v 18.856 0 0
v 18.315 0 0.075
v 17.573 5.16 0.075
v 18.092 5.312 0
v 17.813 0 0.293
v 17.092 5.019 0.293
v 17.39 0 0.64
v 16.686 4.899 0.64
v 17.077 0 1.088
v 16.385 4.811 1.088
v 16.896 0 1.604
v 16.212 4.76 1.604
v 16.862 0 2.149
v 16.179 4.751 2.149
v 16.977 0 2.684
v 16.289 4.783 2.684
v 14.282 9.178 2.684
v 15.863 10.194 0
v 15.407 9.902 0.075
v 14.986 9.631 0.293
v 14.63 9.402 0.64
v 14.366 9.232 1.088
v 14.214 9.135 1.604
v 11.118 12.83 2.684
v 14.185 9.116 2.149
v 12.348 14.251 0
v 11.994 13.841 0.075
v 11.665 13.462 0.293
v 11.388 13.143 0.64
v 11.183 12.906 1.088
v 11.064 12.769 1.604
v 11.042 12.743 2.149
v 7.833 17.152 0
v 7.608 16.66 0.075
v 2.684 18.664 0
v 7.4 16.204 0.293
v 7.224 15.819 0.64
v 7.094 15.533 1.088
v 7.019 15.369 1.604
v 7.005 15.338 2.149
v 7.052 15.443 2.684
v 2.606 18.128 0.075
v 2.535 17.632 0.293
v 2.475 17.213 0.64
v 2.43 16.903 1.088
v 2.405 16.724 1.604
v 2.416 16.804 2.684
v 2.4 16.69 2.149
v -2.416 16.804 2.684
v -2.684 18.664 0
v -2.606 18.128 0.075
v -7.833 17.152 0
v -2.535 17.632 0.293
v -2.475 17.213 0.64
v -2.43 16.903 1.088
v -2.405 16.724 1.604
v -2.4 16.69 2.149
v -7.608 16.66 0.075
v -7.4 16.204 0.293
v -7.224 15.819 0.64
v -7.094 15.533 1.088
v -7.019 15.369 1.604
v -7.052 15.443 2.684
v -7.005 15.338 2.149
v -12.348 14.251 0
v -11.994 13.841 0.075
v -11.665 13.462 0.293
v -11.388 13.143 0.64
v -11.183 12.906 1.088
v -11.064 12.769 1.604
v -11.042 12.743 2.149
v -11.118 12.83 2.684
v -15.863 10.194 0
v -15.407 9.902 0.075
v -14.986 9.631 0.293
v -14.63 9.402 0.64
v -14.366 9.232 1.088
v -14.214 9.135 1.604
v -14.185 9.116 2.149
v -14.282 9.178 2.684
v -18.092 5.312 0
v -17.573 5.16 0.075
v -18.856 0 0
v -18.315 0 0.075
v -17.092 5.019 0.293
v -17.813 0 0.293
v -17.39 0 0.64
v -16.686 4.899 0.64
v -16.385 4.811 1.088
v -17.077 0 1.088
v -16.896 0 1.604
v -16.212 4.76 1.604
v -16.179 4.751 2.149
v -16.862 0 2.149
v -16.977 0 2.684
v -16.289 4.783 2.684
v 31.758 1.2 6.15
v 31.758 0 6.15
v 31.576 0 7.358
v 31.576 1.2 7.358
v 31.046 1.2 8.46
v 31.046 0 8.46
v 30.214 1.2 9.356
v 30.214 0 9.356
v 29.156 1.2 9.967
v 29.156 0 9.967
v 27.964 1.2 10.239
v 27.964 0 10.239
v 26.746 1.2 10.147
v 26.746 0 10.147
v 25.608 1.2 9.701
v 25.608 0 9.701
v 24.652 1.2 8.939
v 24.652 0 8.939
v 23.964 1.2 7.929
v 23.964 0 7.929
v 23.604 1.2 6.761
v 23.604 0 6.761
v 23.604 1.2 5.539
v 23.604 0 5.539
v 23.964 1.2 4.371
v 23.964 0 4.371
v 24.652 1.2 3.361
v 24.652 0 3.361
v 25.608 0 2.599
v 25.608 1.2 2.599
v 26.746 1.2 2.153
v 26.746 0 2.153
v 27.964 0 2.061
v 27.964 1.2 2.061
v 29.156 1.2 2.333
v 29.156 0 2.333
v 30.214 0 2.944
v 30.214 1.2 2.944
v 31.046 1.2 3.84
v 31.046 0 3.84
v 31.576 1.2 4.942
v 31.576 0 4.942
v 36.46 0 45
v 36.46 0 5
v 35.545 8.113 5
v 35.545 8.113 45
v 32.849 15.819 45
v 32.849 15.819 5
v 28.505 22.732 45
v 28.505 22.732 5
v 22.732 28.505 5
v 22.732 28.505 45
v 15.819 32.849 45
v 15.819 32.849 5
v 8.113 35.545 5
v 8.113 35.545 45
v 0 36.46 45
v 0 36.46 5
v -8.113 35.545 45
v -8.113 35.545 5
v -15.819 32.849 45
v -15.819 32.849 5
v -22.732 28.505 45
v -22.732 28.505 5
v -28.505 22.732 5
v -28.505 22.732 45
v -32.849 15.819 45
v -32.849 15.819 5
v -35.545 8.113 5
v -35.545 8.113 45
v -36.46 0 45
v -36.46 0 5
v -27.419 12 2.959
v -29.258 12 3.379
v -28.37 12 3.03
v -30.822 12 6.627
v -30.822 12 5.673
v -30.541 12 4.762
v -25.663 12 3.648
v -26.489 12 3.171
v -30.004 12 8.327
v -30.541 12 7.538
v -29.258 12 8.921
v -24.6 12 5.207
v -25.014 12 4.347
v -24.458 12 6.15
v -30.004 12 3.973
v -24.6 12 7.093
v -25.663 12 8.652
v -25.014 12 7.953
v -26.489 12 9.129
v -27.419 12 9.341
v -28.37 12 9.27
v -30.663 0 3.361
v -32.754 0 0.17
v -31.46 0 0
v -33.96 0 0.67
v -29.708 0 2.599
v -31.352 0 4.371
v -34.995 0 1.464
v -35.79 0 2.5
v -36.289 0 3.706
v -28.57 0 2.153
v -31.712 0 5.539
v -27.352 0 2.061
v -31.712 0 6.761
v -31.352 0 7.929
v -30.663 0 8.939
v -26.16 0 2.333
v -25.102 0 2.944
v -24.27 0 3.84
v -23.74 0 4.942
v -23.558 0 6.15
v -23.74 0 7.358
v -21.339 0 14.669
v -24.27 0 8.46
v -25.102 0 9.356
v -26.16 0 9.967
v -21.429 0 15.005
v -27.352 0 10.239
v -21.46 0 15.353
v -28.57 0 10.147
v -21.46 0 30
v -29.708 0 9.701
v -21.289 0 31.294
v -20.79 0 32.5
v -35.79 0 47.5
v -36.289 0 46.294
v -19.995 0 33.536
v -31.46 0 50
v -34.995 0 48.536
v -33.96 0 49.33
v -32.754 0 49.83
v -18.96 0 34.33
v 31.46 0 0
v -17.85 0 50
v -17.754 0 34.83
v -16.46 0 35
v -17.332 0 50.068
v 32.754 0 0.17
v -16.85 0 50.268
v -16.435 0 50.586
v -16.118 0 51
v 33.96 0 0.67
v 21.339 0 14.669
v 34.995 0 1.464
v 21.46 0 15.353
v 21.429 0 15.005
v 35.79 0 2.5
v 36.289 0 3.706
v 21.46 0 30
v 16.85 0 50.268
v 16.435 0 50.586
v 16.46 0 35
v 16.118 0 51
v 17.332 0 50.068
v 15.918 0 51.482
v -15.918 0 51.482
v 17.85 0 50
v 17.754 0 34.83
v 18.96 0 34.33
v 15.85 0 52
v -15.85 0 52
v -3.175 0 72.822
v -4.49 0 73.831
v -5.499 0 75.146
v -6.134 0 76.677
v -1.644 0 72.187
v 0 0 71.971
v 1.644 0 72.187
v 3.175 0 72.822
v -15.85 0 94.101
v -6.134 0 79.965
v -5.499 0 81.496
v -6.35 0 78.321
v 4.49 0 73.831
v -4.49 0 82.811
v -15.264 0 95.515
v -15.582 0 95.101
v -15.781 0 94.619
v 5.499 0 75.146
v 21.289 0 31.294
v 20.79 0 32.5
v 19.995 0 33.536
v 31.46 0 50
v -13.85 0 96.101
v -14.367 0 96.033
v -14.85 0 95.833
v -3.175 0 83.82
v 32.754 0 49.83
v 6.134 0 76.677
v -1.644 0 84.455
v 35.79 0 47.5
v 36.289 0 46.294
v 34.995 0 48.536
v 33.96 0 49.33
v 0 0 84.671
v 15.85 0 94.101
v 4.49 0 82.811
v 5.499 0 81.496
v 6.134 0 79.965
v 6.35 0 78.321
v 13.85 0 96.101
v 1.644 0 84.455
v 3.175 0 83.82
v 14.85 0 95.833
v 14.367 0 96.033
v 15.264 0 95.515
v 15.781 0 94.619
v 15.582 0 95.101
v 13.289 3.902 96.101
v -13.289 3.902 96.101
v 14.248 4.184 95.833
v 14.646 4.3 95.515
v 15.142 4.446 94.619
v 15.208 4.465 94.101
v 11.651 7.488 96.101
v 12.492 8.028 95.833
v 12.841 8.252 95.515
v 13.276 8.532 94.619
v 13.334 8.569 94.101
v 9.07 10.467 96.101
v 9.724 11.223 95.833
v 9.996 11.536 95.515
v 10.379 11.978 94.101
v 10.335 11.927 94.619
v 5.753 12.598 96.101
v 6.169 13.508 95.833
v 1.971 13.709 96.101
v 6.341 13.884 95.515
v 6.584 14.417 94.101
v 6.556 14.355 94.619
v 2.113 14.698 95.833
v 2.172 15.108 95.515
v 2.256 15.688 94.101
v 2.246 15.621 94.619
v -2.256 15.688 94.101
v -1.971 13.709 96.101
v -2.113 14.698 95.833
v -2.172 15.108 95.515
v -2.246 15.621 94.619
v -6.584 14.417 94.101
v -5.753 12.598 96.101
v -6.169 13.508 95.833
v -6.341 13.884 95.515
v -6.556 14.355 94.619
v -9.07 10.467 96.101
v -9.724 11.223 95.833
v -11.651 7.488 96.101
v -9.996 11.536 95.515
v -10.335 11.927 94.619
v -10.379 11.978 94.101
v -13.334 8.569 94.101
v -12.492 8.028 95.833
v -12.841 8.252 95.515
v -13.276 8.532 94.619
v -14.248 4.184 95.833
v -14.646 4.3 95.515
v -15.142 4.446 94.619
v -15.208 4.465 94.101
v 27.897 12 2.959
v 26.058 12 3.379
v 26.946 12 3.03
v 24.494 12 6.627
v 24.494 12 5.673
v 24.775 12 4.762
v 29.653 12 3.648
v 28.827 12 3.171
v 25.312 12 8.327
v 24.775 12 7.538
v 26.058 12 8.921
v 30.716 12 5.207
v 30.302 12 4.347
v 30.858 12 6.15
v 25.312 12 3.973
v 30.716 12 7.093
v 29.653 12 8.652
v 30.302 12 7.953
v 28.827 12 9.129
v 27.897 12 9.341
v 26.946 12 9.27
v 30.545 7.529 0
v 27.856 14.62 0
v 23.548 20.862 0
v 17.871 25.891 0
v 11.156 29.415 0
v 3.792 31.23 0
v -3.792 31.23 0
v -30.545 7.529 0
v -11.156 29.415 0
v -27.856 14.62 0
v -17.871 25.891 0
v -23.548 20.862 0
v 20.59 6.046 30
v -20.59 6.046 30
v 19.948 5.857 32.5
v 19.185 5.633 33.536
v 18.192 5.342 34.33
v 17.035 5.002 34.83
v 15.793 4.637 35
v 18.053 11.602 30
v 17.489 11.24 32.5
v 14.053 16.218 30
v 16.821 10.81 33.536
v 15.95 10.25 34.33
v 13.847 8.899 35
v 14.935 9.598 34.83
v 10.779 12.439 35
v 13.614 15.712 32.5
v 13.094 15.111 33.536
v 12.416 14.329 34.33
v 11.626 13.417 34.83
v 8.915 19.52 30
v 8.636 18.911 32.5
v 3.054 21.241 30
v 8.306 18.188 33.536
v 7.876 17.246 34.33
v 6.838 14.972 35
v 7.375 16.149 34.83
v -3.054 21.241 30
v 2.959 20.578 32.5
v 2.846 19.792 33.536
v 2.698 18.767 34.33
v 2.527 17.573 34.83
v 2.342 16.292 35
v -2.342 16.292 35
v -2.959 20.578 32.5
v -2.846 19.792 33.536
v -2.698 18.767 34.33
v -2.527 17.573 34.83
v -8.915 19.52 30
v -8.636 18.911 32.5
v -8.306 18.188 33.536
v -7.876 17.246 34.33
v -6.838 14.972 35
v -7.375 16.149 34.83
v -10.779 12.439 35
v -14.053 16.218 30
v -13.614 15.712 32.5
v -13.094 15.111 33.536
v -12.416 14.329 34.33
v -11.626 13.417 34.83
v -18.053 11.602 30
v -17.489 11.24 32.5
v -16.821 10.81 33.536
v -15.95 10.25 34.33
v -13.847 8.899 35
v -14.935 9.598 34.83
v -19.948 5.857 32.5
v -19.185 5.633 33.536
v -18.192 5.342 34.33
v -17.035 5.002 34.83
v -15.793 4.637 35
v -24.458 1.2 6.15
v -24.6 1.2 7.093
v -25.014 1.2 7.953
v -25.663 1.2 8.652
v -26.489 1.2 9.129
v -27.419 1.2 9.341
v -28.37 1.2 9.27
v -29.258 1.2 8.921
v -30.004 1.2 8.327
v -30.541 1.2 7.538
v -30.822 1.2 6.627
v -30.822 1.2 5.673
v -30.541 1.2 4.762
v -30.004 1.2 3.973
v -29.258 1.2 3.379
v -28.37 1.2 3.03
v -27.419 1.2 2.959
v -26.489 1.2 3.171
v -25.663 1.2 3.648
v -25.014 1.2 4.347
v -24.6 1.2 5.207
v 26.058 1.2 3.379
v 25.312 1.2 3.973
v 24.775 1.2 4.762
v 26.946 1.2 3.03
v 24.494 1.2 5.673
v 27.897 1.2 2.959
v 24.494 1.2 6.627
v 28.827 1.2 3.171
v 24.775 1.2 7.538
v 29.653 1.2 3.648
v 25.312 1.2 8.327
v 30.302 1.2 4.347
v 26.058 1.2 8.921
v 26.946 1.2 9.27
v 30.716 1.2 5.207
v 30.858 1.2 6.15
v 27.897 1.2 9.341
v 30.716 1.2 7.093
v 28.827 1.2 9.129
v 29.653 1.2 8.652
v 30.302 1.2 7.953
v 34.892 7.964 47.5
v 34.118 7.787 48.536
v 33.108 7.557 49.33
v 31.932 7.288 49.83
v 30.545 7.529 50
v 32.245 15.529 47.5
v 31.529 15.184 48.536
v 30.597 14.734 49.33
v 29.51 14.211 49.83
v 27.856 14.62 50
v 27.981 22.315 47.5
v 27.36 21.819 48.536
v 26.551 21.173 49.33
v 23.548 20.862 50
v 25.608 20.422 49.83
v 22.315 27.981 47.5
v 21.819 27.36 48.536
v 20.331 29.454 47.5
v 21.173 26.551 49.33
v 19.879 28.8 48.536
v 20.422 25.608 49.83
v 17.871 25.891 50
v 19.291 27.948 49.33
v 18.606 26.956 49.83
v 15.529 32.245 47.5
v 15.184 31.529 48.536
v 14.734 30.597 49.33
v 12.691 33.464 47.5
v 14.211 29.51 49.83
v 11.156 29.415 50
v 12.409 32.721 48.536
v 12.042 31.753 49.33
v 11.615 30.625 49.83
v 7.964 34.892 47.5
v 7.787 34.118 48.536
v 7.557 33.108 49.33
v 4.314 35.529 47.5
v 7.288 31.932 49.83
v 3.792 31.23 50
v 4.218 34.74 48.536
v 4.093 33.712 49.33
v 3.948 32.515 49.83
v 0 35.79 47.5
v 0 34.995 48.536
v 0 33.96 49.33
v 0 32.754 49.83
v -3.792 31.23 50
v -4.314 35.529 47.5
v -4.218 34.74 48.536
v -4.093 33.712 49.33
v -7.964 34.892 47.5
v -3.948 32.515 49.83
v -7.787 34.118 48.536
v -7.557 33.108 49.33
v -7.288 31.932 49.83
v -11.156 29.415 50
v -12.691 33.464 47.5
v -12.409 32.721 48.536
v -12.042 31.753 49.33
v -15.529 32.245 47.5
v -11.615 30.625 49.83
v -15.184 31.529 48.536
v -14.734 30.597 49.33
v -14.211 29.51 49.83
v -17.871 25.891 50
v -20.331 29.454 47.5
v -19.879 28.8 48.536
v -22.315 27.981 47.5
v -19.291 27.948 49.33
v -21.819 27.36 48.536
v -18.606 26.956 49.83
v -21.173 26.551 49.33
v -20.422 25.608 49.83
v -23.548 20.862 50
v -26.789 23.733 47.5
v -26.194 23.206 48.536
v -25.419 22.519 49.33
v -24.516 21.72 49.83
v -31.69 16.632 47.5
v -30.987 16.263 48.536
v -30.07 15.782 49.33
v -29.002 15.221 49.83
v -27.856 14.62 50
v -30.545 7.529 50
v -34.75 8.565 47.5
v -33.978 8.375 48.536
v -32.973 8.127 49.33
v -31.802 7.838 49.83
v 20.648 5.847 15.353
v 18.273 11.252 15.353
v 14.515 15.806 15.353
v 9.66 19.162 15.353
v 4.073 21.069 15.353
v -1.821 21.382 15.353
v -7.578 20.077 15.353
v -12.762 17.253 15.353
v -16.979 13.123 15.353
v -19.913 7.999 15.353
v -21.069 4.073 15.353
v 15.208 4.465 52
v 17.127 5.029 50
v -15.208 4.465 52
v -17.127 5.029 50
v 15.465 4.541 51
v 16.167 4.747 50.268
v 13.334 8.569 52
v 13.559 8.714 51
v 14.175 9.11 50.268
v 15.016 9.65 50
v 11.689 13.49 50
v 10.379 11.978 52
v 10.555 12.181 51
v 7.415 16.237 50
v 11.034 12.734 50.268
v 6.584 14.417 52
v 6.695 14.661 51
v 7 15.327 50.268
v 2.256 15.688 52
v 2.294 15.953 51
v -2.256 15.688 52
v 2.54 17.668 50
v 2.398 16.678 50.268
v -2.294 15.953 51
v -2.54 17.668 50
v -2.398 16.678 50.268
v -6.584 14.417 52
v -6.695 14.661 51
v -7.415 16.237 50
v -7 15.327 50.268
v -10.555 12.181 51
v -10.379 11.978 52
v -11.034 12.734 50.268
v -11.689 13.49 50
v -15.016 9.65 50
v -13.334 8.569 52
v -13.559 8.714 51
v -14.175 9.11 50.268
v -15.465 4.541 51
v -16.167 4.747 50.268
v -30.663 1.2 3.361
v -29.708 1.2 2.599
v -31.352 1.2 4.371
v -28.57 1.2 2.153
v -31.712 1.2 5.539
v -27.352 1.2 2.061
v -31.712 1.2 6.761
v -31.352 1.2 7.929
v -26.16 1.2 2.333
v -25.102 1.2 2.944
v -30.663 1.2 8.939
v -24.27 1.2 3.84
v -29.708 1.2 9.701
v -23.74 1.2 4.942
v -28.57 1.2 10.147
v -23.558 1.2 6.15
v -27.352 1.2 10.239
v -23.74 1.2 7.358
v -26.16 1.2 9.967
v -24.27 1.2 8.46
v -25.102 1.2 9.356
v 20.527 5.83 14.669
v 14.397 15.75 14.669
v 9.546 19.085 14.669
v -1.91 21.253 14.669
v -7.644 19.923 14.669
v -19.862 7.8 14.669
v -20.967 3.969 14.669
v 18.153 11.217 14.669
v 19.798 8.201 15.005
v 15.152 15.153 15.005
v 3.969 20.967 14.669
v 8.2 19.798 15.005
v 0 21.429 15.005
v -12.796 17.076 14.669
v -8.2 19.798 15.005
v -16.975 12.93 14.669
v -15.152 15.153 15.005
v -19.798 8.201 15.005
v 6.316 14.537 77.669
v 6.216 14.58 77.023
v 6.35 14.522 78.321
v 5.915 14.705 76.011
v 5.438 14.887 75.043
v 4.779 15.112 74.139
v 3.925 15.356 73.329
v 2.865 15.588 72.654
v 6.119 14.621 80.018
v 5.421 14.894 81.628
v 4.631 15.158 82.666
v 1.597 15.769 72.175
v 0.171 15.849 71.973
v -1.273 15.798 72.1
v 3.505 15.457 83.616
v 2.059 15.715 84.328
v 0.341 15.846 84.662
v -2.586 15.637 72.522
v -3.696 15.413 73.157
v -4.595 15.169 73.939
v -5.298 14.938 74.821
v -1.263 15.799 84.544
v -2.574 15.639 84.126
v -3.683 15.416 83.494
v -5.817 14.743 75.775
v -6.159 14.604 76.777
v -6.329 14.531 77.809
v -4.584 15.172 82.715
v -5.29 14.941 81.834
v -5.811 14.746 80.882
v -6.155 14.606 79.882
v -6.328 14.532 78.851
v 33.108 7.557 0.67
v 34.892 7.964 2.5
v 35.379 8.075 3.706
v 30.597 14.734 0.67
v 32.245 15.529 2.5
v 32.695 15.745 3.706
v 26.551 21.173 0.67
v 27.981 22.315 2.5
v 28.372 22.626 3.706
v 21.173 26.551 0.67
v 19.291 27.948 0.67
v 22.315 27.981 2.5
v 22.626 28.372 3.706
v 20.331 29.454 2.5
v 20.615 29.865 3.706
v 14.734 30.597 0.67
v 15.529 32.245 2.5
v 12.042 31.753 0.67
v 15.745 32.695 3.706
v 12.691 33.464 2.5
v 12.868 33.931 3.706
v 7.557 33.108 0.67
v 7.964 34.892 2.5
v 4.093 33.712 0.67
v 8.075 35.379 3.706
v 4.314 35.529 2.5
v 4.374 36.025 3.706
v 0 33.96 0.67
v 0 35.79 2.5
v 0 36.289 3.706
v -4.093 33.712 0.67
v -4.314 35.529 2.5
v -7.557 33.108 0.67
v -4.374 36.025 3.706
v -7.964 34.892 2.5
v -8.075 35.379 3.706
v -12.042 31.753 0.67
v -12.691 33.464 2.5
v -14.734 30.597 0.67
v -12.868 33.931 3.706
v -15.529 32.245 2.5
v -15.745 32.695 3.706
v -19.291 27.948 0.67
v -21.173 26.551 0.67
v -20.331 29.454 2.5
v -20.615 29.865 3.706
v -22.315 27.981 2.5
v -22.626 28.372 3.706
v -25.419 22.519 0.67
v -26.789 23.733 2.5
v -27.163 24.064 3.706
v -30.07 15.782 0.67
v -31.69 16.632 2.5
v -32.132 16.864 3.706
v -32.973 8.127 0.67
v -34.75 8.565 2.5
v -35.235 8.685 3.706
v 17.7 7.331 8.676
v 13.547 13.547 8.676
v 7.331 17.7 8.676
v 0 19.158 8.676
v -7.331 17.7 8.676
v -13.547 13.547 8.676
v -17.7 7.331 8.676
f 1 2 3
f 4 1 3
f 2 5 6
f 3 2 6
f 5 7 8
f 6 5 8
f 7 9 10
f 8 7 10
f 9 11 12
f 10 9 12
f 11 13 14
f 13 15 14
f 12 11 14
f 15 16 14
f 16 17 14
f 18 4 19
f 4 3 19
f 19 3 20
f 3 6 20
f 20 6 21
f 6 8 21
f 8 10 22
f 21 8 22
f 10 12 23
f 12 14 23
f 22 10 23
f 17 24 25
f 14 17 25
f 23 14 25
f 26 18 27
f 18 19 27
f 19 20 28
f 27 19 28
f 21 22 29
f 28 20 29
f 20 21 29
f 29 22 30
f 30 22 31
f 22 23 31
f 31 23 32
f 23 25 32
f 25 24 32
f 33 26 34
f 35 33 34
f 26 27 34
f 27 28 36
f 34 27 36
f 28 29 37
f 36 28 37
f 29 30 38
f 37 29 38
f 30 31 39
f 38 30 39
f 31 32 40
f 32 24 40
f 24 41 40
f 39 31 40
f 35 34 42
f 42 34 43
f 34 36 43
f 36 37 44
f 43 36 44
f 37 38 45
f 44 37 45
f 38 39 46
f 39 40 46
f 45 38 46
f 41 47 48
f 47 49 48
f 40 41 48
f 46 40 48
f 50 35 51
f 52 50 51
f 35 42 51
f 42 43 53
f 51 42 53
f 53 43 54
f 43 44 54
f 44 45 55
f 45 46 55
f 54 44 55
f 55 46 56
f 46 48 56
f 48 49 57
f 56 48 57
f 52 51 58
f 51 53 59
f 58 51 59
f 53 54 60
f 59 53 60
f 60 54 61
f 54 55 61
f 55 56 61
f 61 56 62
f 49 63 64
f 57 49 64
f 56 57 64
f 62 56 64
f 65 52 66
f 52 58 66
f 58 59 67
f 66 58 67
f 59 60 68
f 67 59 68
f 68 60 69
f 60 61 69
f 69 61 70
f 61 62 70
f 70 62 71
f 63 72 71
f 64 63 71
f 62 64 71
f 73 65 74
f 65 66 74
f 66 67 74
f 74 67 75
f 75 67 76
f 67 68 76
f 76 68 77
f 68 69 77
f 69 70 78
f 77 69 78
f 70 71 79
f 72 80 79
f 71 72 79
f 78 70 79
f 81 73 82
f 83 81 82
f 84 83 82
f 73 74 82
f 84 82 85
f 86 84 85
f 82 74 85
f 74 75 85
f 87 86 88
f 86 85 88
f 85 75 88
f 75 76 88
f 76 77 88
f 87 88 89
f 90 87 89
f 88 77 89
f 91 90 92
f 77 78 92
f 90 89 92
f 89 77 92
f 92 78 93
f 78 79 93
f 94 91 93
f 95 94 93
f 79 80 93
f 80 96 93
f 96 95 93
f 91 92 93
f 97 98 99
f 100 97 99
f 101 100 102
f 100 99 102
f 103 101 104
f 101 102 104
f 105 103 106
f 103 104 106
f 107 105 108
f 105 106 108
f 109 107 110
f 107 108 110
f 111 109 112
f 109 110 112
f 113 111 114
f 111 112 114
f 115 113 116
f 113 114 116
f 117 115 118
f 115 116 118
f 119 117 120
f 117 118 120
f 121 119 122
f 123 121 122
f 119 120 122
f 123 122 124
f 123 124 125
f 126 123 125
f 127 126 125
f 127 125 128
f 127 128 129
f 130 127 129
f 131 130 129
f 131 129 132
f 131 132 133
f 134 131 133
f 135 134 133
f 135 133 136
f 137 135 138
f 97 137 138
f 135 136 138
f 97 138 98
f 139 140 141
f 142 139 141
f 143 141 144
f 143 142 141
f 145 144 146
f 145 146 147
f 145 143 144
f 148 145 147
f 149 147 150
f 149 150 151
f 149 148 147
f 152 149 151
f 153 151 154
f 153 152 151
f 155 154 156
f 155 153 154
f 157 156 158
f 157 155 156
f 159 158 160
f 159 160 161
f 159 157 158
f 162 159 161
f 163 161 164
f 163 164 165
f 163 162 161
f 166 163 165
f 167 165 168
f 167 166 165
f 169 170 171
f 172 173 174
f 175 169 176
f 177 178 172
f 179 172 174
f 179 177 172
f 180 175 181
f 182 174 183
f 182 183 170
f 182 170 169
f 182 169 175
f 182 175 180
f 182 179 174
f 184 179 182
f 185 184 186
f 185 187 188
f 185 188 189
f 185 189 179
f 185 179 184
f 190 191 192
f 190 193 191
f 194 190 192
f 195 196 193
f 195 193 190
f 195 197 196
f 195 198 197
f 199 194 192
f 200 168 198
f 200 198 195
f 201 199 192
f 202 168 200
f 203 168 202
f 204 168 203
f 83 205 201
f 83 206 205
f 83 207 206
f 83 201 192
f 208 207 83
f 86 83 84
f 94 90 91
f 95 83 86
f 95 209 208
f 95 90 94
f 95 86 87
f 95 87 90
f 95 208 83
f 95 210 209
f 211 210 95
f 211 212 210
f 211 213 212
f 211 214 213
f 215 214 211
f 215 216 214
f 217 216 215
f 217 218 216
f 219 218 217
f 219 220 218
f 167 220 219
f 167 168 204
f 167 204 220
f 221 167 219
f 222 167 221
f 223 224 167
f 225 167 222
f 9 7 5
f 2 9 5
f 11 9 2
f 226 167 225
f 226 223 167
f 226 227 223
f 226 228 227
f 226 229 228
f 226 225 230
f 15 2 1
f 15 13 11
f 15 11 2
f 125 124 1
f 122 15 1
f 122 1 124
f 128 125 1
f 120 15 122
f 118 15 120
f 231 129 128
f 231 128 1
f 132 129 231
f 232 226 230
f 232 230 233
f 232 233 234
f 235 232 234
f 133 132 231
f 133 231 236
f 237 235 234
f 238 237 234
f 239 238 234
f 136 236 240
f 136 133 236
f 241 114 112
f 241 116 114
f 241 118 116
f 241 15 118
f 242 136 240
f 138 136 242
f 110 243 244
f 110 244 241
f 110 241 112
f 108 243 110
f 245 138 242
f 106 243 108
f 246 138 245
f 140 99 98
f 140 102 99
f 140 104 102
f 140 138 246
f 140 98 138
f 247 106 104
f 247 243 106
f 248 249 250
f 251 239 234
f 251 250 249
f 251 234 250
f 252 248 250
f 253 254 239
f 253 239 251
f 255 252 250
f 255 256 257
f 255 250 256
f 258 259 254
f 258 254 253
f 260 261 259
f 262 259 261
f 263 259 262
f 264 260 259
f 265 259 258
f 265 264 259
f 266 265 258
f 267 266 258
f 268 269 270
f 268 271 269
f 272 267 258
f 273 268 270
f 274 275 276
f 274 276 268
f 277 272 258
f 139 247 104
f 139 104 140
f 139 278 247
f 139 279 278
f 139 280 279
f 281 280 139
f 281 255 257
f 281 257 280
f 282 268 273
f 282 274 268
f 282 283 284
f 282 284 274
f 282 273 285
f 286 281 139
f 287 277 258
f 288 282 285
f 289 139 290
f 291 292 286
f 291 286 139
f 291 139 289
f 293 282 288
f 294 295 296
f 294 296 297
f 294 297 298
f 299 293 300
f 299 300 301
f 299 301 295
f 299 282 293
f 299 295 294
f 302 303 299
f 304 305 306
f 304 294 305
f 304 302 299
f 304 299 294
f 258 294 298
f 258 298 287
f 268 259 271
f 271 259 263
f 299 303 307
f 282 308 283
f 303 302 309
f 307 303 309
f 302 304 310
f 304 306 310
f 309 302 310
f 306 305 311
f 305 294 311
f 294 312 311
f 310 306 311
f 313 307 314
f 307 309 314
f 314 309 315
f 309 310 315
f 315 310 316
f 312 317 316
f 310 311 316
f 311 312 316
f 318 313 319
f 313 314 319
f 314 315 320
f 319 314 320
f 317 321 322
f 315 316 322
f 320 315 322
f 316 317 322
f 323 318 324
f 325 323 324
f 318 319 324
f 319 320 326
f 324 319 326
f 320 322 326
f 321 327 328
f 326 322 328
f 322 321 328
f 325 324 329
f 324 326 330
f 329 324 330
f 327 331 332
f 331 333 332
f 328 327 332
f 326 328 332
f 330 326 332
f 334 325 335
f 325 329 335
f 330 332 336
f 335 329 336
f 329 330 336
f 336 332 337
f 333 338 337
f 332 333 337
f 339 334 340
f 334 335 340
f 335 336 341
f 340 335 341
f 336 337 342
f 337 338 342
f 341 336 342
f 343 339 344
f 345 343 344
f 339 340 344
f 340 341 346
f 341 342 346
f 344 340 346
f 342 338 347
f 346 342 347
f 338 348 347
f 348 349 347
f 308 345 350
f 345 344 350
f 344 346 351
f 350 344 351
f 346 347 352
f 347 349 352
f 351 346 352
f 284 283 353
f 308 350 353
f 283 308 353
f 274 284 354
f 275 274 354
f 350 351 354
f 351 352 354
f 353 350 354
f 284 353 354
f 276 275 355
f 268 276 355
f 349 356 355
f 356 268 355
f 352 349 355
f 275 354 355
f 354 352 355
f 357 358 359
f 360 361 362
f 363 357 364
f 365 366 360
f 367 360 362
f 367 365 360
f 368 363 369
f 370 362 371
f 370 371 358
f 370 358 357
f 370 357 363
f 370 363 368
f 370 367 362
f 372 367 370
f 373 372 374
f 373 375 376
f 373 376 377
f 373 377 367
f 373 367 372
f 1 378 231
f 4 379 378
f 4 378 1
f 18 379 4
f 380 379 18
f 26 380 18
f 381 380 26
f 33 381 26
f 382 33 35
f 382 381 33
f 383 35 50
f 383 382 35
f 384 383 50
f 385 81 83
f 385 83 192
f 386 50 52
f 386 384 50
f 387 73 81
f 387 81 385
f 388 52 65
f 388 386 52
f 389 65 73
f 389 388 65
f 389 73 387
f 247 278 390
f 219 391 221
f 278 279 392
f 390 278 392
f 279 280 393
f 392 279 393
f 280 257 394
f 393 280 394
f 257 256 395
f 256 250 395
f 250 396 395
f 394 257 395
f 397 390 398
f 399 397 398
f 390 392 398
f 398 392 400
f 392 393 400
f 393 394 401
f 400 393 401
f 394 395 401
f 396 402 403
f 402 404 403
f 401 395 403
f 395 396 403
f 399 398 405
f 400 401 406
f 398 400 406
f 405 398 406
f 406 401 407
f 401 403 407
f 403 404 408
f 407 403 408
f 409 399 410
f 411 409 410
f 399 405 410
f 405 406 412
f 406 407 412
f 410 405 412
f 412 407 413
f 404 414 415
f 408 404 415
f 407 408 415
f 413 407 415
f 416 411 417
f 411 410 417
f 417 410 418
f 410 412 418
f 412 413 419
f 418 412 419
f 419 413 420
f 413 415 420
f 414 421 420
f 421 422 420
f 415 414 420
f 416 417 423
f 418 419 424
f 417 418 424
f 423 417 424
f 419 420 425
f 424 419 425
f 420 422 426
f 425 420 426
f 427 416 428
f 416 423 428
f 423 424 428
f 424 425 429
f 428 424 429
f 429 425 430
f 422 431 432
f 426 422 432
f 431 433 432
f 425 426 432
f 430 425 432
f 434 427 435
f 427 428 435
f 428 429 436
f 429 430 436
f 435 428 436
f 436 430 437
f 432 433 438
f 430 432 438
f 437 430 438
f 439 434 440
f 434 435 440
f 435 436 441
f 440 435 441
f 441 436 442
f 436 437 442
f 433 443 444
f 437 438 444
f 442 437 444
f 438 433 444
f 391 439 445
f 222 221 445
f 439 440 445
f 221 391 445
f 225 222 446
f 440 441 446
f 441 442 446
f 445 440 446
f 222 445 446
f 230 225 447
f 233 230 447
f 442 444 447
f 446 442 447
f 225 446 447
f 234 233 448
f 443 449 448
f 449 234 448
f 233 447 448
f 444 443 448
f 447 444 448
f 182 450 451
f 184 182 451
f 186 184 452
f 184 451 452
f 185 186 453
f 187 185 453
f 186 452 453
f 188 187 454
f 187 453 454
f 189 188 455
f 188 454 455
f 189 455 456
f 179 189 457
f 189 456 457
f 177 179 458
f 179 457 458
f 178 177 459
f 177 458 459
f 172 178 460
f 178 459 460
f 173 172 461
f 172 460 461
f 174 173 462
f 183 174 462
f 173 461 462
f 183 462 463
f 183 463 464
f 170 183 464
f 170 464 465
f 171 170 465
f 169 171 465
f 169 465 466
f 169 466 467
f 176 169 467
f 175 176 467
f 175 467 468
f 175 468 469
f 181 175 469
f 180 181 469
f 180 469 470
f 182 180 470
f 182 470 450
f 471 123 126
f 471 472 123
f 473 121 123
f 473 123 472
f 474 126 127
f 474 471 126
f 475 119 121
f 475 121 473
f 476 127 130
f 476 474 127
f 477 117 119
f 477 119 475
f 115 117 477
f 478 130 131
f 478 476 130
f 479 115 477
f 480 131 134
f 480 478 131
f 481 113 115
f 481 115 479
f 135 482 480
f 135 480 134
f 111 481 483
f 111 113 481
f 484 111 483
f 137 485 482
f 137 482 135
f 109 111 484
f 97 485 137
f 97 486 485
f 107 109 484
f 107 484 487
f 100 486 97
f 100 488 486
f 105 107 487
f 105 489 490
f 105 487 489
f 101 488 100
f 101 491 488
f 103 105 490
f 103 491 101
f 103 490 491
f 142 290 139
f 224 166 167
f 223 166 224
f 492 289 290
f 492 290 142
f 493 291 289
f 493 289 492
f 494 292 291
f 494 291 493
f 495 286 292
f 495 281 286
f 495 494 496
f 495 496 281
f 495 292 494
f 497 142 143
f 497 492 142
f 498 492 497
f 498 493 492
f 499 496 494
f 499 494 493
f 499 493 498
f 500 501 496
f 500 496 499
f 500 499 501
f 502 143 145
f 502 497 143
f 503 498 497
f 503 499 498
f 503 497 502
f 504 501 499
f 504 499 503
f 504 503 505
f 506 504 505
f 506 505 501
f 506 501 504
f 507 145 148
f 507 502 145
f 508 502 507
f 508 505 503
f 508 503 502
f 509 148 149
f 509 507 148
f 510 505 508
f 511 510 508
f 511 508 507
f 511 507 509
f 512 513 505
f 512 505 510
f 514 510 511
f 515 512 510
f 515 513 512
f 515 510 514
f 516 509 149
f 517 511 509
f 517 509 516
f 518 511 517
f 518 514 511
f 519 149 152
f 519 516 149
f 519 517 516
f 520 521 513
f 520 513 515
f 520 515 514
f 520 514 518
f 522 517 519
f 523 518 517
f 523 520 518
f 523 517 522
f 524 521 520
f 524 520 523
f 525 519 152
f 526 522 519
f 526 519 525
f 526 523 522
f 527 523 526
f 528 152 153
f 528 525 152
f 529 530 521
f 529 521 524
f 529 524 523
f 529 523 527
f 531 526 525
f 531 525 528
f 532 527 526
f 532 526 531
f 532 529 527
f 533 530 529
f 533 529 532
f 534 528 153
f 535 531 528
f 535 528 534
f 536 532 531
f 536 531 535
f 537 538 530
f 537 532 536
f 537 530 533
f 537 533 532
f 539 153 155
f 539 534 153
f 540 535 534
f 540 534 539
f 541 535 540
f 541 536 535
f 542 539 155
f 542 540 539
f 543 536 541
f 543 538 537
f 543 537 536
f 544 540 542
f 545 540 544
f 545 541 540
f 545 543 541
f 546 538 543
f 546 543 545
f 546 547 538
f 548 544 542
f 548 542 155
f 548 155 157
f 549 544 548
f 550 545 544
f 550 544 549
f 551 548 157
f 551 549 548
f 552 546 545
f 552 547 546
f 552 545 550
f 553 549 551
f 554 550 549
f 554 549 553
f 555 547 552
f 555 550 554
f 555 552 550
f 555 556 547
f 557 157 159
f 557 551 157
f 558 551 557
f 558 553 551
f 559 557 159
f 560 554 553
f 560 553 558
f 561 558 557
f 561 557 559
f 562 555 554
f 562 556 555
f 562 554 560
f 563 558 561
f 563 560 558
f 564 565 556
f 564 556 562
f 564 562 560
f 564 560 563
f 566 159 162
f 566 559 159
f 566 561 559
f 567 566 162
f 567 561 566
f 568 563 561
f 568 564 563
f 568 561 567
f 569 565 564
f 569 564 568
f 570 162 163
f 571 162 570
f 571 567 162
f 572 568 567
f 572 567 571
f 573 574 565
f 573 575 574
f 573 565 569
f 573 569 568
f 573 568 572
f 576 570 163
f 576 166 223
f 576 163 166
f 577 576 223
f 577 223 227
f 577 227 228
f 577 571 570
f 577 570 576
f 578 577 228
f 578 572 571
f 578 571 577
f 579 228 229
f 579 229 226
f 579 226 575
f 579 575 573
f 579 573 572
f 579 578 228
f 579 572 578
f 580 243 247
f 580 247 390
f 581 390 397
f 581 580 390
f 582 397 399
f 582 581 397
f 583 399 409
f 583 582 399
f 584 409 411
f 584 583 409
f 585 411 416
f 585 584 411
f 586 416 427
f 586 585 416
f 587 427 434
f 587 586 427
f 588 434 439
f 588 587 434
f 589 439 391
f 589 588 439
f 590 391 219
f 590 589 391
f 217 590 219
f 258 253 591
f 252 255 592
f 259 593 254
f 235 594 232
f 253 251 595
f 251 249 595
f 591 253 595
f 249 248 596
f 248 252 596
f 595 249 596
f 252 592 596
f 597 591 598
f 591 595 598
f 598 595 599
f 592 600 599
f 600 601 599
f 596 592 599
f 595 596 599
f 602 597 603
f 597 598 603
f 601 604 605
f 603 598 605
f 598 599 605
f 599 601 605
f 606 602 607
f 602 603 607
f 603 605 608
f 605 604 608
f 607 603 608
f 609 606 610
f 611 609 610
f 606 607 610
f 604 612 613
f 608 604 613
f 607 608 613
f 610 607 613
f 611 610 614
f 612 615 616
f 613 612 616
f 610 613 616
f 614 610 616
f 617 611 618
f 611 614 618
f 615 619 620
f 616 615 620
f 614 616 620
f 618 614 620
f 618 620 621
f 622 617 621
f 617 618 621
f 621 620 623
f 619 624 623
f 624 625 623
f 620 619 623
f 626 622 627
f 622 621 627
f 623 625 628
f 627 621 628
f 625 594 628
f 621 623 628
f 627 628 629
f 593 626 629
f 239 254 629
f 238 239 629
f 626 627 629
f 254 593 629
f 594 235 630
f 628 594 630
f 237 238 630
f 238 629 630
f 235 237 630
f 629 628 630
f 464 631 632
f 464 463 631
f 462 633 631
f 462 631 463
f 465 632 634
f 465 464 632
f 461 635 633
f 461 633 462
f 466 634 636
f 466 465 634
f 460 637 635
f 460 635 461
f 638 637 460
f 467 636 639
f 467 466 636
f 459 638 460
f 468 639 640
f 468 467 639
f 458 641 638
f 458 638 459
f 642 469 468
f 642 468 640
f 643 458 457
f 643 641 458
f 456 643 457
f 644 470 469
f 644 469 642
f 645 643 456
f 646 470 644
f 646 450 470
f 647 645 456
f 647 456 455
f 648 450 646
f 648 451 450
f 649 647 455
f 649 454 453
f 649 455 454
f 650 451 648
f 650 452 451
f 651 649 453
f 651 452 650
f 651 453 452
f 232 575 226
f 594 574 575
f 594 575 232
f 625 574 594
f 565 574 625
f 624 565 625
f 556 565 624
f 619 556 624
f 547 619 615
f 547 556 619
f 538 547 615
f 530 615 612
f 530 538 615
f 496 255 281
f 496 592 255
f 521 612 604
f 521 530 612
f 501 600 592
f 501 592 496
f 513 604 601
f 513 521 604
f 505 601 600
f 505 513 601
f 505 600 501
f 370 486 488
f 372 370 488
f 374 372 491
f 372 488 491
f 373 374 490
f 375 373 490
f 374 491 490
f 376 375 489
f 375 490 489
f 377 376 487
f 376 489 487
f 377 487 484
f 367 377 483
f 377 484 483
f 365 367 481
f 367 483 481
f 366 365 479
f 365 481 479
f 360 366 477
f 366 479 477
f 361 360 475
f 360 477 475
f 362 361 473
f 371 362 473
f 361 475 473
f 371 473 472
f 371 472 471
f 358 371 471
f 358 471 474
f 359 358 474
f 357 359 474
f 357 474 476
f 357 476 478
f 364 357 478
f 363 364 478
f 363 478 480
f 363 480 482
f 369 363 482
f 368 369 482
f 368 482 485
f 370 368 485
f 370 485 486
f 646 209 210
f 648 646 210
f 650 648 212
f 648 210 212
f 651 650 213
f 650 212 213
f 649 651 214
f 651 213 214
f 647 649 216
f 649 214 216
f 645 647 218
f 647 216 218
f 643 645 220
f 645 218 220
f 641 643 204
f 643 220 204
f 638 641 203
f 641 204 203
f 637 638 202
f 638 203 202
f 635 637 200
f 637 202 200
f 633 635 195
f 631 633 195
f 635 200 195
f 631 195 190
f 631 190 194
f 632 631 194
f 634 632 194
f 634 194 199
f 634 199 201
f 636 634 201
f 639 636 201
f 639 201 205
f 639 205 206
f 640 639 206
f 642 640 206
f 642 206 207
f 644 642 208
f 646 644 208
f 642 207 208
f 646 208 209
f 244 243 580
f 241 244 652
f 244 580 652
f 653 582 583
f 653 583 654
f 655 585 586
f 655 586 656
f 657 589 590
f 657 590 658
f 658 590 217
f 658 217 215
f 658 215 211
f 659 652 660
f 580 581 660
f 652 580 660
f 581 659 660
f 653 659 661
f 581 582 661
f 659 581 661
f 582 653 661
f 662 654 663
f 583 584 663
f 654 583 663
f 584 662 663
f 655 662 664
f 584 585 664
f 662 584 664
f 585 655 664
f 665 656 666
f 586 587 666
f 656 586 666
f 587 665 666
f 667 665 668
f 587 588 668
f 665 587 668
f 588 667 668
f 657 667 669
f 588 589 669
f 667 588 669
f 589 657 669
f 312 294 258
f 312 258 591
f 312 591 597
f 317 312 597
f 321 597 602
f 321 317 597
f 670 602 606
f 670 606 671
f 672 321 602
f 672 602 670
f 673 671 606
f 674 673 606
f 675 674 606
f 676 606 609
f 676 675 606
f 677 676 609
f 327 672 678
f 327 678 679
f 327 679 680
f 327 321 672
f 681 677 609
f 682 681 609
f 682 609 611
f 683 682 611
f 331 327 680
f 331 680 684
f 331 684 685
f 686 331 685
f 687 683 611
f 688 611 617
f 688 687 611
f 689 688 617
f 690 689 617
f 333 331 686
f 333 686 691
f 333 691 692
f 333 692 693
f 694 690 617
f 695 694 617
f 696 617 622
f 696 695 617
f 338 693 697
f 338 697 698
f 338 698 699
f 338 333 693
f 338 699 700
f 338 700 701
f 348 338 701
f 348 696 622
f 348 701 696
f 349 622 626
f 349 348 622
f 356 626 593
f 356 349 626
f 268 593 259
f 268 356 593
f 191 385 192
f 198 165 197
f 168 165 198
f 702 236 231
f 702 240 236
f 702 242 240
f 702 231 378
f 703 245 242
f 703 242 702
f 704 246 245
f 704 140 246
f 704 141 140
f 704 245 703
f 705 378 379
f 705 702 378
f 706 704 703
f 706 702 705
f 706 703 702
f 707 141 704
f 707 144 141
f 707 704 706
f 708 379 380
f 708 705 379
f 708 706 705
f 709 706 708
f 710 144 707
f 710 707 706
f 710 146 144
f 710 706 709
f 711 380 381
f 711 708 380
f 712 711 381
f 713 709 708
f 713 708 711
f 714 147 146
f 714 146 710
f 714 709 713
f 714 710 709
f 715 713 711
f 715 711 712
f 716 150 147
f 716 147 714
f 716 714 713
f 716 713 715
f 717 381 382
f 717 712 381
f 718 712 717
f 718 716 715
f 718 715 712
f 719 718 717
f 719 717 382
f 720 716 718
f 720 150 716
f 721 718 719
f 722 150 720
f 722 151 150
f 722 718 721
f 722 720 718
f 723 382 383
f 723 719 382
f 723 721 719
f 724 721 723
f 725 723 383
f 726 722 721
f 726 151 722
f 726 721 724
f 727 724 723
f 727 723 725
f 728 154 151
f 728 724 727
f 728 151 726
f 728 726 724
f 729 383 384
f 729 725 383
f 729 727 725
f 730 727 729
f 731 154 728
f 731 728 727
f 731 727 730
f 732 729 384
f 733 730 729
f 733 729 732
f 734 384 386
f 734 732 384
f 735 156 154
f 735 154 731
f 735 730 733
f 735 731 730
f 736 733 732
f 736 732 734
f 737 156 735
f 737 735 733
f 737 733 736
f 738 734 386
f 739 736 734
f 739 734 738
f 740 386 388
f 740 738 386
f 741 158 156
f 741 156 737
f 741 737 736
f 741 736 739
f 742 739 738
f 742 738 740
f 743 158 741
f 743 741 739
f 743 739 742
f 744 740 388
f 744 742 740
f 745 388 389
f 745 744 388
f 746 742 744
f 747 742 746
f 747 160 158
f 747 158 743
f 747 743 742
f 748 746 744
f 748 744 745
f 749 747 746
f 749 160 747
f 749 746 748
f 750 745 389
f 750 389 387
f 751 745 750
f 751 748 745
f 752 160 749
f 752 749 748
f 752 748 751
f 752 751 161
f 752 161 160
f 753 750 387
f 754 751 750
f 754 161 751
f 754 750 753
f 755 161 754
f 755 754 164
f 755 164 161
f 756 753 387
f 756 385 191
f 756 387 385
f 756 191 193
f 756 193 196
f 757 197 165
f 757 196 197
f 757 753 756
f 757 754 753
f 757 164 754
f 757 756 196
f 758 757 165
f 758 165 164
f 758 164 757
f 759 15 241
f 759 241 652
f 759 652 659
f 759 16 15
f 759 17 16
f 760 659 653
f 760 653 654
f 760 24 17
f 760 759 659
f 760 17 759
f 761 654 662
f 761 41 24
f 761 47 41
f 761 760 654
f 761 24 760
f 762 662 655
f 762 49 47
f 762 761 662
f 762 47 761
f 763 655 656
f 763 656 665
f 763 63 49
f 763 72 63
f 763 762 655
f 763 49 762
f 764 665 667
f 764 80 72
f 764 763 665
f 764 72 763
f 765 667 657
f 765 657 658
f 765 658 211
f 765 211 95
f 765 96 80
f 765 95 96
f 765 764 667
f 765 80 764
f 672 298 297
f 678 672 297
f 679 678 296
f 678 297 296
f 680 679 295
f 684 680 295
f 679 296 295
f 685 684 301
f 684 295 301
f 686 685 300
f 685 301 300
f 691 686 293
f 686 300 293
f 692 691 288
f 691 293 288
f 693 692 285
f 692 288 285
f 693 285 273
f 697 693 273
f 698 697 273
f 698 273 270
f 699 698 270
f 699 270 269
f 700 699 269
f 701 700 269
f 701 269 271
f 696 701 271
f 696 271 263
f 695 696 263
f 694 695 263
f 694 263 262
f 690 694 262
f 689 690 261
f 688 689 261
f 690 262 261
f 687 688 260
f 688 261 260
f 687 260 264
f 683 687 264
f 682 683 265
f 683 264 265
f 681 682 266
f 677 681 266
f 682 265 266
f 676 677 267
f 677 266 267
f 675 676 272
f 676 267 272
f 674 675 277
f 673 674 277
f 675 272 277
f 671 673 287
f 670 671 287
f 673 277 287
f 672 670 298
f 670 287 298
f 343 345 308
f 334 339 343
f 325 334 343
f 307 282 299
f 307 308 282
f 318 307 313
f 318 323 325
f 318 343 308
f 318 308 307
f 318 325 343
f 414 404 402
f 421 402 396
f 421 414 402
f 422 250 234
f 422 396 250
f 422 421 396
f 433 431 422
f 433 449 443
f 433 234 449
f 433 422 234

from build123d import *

# Parameters (mm, degrees)
F1_ANGLE = -180
F2_R     = 2
F3_R     = 4.1
F3_R_2   = 3.2
F4_DEPTH = 1.2
F5_DEPTH = 12
F3_R_3   = 6.35
F6_DEPTH = 36.460554
F7_R     = 5


with BuildPart() as f1:
    # F0 (on Front) → F1 (revolve)
    with BuildSketch(Plane.XZ):
        with BuildLine():
            Line((21.459554, 35), (21.459554, 15))
            Line((21.459554, 15), (21.459554, 0))
            Line((21.459554, 0), (36.459554, 0))
            Line((36.459554, 0), (36.459554, 50))
            Line((36.459554, 50), (15.8496, 50))
            Line((15.8496, 50), (15.8496, 96.101))
            Line((15.8496, 96.101), (0, 96.101))
            Line((0, 96.101), (0, 84.671))
            ThreePointArc((0, 84.671), (4.490128, 82.811128), (6.35, 78.321))
            ThreePointArc((6.35, 78.321), (4.490128, 73.830872), (0, 71.971))
            Line((0, 71.971), (0, 35))
            Line((0, 35), (21.459554, 35))
        make_face()
        Polygon((21.459554, 15), (16, 0), (21.459554, 0), align=None)
    revolve(axis=Axis((0, 0, 65.5505), (0, 0, -1)), revolution_arc=F1_ANGLE)

    # F2
    f2_edges = [f1.edges().sort_by_distance(p)[0] for p in [
        (0, 15.8496, 50),
        (0, 15.8496, 96.101),
        (0, 16, 0),
        (0, 21.459554, 15),
    ]]
    fillet(f2_edges, radius=F2_R)

    # F3 (on Front) → F4 (cut)
    with BuildSketch(Plane.XZ):
        with Locations((27.657925, 6.15)):
            Circle(F3_R)
        with Locations((27.657925, 6.15)):
            Circle(F3_R_2, mode=Mode.SUBTRACT)
        with Locations((-27.657925, 6.15)):
            Circle(F3_R)
        with Locations((-27.657925, 6.15)):
            Circle(F3_R_2, mode=Mode.SUBTRACT)
        with Locations((-27.657925, 6.15)):
            Circle(F3_R_2)
        with Locations((27.657925, 6.15)):
            Circle(F3_R_2)
    extrude(amount=-F4_DEPTH, mode=Mode.SUBTRACT)

    # F3 (on Front) → F5 (cut)
    with BuildSketch(Plane.XZ):
        with Locations((-27.657925, 6.15)):
            Circle(F3_R_2)
        with Locations((27.657925, 6.15)):
            Circle(F3_R_2)
    extrude(amount=-F5_DEPTH, mode=Mode.SUBTRACT)

    # F3 (on Front) → F6 (cut, through all)
    with BuildSketch(Plane.XZ):
        with Locations((0, 78.321)):
            Circle(F3_R_3)
    extrude(amount=-F6_DEPTH, mode=Mode.SUBTRACT)

    # F7
    f7_edges = [f1.edges().sort_by_distance(p)[0] for p in [
        (0, 36.459554, 50),
        (0, 36.459554, 0),
        (0, 21.459554, 35),
    ]]
    fillet(f7_edges, radius=F7_R)


solid = f1.part
